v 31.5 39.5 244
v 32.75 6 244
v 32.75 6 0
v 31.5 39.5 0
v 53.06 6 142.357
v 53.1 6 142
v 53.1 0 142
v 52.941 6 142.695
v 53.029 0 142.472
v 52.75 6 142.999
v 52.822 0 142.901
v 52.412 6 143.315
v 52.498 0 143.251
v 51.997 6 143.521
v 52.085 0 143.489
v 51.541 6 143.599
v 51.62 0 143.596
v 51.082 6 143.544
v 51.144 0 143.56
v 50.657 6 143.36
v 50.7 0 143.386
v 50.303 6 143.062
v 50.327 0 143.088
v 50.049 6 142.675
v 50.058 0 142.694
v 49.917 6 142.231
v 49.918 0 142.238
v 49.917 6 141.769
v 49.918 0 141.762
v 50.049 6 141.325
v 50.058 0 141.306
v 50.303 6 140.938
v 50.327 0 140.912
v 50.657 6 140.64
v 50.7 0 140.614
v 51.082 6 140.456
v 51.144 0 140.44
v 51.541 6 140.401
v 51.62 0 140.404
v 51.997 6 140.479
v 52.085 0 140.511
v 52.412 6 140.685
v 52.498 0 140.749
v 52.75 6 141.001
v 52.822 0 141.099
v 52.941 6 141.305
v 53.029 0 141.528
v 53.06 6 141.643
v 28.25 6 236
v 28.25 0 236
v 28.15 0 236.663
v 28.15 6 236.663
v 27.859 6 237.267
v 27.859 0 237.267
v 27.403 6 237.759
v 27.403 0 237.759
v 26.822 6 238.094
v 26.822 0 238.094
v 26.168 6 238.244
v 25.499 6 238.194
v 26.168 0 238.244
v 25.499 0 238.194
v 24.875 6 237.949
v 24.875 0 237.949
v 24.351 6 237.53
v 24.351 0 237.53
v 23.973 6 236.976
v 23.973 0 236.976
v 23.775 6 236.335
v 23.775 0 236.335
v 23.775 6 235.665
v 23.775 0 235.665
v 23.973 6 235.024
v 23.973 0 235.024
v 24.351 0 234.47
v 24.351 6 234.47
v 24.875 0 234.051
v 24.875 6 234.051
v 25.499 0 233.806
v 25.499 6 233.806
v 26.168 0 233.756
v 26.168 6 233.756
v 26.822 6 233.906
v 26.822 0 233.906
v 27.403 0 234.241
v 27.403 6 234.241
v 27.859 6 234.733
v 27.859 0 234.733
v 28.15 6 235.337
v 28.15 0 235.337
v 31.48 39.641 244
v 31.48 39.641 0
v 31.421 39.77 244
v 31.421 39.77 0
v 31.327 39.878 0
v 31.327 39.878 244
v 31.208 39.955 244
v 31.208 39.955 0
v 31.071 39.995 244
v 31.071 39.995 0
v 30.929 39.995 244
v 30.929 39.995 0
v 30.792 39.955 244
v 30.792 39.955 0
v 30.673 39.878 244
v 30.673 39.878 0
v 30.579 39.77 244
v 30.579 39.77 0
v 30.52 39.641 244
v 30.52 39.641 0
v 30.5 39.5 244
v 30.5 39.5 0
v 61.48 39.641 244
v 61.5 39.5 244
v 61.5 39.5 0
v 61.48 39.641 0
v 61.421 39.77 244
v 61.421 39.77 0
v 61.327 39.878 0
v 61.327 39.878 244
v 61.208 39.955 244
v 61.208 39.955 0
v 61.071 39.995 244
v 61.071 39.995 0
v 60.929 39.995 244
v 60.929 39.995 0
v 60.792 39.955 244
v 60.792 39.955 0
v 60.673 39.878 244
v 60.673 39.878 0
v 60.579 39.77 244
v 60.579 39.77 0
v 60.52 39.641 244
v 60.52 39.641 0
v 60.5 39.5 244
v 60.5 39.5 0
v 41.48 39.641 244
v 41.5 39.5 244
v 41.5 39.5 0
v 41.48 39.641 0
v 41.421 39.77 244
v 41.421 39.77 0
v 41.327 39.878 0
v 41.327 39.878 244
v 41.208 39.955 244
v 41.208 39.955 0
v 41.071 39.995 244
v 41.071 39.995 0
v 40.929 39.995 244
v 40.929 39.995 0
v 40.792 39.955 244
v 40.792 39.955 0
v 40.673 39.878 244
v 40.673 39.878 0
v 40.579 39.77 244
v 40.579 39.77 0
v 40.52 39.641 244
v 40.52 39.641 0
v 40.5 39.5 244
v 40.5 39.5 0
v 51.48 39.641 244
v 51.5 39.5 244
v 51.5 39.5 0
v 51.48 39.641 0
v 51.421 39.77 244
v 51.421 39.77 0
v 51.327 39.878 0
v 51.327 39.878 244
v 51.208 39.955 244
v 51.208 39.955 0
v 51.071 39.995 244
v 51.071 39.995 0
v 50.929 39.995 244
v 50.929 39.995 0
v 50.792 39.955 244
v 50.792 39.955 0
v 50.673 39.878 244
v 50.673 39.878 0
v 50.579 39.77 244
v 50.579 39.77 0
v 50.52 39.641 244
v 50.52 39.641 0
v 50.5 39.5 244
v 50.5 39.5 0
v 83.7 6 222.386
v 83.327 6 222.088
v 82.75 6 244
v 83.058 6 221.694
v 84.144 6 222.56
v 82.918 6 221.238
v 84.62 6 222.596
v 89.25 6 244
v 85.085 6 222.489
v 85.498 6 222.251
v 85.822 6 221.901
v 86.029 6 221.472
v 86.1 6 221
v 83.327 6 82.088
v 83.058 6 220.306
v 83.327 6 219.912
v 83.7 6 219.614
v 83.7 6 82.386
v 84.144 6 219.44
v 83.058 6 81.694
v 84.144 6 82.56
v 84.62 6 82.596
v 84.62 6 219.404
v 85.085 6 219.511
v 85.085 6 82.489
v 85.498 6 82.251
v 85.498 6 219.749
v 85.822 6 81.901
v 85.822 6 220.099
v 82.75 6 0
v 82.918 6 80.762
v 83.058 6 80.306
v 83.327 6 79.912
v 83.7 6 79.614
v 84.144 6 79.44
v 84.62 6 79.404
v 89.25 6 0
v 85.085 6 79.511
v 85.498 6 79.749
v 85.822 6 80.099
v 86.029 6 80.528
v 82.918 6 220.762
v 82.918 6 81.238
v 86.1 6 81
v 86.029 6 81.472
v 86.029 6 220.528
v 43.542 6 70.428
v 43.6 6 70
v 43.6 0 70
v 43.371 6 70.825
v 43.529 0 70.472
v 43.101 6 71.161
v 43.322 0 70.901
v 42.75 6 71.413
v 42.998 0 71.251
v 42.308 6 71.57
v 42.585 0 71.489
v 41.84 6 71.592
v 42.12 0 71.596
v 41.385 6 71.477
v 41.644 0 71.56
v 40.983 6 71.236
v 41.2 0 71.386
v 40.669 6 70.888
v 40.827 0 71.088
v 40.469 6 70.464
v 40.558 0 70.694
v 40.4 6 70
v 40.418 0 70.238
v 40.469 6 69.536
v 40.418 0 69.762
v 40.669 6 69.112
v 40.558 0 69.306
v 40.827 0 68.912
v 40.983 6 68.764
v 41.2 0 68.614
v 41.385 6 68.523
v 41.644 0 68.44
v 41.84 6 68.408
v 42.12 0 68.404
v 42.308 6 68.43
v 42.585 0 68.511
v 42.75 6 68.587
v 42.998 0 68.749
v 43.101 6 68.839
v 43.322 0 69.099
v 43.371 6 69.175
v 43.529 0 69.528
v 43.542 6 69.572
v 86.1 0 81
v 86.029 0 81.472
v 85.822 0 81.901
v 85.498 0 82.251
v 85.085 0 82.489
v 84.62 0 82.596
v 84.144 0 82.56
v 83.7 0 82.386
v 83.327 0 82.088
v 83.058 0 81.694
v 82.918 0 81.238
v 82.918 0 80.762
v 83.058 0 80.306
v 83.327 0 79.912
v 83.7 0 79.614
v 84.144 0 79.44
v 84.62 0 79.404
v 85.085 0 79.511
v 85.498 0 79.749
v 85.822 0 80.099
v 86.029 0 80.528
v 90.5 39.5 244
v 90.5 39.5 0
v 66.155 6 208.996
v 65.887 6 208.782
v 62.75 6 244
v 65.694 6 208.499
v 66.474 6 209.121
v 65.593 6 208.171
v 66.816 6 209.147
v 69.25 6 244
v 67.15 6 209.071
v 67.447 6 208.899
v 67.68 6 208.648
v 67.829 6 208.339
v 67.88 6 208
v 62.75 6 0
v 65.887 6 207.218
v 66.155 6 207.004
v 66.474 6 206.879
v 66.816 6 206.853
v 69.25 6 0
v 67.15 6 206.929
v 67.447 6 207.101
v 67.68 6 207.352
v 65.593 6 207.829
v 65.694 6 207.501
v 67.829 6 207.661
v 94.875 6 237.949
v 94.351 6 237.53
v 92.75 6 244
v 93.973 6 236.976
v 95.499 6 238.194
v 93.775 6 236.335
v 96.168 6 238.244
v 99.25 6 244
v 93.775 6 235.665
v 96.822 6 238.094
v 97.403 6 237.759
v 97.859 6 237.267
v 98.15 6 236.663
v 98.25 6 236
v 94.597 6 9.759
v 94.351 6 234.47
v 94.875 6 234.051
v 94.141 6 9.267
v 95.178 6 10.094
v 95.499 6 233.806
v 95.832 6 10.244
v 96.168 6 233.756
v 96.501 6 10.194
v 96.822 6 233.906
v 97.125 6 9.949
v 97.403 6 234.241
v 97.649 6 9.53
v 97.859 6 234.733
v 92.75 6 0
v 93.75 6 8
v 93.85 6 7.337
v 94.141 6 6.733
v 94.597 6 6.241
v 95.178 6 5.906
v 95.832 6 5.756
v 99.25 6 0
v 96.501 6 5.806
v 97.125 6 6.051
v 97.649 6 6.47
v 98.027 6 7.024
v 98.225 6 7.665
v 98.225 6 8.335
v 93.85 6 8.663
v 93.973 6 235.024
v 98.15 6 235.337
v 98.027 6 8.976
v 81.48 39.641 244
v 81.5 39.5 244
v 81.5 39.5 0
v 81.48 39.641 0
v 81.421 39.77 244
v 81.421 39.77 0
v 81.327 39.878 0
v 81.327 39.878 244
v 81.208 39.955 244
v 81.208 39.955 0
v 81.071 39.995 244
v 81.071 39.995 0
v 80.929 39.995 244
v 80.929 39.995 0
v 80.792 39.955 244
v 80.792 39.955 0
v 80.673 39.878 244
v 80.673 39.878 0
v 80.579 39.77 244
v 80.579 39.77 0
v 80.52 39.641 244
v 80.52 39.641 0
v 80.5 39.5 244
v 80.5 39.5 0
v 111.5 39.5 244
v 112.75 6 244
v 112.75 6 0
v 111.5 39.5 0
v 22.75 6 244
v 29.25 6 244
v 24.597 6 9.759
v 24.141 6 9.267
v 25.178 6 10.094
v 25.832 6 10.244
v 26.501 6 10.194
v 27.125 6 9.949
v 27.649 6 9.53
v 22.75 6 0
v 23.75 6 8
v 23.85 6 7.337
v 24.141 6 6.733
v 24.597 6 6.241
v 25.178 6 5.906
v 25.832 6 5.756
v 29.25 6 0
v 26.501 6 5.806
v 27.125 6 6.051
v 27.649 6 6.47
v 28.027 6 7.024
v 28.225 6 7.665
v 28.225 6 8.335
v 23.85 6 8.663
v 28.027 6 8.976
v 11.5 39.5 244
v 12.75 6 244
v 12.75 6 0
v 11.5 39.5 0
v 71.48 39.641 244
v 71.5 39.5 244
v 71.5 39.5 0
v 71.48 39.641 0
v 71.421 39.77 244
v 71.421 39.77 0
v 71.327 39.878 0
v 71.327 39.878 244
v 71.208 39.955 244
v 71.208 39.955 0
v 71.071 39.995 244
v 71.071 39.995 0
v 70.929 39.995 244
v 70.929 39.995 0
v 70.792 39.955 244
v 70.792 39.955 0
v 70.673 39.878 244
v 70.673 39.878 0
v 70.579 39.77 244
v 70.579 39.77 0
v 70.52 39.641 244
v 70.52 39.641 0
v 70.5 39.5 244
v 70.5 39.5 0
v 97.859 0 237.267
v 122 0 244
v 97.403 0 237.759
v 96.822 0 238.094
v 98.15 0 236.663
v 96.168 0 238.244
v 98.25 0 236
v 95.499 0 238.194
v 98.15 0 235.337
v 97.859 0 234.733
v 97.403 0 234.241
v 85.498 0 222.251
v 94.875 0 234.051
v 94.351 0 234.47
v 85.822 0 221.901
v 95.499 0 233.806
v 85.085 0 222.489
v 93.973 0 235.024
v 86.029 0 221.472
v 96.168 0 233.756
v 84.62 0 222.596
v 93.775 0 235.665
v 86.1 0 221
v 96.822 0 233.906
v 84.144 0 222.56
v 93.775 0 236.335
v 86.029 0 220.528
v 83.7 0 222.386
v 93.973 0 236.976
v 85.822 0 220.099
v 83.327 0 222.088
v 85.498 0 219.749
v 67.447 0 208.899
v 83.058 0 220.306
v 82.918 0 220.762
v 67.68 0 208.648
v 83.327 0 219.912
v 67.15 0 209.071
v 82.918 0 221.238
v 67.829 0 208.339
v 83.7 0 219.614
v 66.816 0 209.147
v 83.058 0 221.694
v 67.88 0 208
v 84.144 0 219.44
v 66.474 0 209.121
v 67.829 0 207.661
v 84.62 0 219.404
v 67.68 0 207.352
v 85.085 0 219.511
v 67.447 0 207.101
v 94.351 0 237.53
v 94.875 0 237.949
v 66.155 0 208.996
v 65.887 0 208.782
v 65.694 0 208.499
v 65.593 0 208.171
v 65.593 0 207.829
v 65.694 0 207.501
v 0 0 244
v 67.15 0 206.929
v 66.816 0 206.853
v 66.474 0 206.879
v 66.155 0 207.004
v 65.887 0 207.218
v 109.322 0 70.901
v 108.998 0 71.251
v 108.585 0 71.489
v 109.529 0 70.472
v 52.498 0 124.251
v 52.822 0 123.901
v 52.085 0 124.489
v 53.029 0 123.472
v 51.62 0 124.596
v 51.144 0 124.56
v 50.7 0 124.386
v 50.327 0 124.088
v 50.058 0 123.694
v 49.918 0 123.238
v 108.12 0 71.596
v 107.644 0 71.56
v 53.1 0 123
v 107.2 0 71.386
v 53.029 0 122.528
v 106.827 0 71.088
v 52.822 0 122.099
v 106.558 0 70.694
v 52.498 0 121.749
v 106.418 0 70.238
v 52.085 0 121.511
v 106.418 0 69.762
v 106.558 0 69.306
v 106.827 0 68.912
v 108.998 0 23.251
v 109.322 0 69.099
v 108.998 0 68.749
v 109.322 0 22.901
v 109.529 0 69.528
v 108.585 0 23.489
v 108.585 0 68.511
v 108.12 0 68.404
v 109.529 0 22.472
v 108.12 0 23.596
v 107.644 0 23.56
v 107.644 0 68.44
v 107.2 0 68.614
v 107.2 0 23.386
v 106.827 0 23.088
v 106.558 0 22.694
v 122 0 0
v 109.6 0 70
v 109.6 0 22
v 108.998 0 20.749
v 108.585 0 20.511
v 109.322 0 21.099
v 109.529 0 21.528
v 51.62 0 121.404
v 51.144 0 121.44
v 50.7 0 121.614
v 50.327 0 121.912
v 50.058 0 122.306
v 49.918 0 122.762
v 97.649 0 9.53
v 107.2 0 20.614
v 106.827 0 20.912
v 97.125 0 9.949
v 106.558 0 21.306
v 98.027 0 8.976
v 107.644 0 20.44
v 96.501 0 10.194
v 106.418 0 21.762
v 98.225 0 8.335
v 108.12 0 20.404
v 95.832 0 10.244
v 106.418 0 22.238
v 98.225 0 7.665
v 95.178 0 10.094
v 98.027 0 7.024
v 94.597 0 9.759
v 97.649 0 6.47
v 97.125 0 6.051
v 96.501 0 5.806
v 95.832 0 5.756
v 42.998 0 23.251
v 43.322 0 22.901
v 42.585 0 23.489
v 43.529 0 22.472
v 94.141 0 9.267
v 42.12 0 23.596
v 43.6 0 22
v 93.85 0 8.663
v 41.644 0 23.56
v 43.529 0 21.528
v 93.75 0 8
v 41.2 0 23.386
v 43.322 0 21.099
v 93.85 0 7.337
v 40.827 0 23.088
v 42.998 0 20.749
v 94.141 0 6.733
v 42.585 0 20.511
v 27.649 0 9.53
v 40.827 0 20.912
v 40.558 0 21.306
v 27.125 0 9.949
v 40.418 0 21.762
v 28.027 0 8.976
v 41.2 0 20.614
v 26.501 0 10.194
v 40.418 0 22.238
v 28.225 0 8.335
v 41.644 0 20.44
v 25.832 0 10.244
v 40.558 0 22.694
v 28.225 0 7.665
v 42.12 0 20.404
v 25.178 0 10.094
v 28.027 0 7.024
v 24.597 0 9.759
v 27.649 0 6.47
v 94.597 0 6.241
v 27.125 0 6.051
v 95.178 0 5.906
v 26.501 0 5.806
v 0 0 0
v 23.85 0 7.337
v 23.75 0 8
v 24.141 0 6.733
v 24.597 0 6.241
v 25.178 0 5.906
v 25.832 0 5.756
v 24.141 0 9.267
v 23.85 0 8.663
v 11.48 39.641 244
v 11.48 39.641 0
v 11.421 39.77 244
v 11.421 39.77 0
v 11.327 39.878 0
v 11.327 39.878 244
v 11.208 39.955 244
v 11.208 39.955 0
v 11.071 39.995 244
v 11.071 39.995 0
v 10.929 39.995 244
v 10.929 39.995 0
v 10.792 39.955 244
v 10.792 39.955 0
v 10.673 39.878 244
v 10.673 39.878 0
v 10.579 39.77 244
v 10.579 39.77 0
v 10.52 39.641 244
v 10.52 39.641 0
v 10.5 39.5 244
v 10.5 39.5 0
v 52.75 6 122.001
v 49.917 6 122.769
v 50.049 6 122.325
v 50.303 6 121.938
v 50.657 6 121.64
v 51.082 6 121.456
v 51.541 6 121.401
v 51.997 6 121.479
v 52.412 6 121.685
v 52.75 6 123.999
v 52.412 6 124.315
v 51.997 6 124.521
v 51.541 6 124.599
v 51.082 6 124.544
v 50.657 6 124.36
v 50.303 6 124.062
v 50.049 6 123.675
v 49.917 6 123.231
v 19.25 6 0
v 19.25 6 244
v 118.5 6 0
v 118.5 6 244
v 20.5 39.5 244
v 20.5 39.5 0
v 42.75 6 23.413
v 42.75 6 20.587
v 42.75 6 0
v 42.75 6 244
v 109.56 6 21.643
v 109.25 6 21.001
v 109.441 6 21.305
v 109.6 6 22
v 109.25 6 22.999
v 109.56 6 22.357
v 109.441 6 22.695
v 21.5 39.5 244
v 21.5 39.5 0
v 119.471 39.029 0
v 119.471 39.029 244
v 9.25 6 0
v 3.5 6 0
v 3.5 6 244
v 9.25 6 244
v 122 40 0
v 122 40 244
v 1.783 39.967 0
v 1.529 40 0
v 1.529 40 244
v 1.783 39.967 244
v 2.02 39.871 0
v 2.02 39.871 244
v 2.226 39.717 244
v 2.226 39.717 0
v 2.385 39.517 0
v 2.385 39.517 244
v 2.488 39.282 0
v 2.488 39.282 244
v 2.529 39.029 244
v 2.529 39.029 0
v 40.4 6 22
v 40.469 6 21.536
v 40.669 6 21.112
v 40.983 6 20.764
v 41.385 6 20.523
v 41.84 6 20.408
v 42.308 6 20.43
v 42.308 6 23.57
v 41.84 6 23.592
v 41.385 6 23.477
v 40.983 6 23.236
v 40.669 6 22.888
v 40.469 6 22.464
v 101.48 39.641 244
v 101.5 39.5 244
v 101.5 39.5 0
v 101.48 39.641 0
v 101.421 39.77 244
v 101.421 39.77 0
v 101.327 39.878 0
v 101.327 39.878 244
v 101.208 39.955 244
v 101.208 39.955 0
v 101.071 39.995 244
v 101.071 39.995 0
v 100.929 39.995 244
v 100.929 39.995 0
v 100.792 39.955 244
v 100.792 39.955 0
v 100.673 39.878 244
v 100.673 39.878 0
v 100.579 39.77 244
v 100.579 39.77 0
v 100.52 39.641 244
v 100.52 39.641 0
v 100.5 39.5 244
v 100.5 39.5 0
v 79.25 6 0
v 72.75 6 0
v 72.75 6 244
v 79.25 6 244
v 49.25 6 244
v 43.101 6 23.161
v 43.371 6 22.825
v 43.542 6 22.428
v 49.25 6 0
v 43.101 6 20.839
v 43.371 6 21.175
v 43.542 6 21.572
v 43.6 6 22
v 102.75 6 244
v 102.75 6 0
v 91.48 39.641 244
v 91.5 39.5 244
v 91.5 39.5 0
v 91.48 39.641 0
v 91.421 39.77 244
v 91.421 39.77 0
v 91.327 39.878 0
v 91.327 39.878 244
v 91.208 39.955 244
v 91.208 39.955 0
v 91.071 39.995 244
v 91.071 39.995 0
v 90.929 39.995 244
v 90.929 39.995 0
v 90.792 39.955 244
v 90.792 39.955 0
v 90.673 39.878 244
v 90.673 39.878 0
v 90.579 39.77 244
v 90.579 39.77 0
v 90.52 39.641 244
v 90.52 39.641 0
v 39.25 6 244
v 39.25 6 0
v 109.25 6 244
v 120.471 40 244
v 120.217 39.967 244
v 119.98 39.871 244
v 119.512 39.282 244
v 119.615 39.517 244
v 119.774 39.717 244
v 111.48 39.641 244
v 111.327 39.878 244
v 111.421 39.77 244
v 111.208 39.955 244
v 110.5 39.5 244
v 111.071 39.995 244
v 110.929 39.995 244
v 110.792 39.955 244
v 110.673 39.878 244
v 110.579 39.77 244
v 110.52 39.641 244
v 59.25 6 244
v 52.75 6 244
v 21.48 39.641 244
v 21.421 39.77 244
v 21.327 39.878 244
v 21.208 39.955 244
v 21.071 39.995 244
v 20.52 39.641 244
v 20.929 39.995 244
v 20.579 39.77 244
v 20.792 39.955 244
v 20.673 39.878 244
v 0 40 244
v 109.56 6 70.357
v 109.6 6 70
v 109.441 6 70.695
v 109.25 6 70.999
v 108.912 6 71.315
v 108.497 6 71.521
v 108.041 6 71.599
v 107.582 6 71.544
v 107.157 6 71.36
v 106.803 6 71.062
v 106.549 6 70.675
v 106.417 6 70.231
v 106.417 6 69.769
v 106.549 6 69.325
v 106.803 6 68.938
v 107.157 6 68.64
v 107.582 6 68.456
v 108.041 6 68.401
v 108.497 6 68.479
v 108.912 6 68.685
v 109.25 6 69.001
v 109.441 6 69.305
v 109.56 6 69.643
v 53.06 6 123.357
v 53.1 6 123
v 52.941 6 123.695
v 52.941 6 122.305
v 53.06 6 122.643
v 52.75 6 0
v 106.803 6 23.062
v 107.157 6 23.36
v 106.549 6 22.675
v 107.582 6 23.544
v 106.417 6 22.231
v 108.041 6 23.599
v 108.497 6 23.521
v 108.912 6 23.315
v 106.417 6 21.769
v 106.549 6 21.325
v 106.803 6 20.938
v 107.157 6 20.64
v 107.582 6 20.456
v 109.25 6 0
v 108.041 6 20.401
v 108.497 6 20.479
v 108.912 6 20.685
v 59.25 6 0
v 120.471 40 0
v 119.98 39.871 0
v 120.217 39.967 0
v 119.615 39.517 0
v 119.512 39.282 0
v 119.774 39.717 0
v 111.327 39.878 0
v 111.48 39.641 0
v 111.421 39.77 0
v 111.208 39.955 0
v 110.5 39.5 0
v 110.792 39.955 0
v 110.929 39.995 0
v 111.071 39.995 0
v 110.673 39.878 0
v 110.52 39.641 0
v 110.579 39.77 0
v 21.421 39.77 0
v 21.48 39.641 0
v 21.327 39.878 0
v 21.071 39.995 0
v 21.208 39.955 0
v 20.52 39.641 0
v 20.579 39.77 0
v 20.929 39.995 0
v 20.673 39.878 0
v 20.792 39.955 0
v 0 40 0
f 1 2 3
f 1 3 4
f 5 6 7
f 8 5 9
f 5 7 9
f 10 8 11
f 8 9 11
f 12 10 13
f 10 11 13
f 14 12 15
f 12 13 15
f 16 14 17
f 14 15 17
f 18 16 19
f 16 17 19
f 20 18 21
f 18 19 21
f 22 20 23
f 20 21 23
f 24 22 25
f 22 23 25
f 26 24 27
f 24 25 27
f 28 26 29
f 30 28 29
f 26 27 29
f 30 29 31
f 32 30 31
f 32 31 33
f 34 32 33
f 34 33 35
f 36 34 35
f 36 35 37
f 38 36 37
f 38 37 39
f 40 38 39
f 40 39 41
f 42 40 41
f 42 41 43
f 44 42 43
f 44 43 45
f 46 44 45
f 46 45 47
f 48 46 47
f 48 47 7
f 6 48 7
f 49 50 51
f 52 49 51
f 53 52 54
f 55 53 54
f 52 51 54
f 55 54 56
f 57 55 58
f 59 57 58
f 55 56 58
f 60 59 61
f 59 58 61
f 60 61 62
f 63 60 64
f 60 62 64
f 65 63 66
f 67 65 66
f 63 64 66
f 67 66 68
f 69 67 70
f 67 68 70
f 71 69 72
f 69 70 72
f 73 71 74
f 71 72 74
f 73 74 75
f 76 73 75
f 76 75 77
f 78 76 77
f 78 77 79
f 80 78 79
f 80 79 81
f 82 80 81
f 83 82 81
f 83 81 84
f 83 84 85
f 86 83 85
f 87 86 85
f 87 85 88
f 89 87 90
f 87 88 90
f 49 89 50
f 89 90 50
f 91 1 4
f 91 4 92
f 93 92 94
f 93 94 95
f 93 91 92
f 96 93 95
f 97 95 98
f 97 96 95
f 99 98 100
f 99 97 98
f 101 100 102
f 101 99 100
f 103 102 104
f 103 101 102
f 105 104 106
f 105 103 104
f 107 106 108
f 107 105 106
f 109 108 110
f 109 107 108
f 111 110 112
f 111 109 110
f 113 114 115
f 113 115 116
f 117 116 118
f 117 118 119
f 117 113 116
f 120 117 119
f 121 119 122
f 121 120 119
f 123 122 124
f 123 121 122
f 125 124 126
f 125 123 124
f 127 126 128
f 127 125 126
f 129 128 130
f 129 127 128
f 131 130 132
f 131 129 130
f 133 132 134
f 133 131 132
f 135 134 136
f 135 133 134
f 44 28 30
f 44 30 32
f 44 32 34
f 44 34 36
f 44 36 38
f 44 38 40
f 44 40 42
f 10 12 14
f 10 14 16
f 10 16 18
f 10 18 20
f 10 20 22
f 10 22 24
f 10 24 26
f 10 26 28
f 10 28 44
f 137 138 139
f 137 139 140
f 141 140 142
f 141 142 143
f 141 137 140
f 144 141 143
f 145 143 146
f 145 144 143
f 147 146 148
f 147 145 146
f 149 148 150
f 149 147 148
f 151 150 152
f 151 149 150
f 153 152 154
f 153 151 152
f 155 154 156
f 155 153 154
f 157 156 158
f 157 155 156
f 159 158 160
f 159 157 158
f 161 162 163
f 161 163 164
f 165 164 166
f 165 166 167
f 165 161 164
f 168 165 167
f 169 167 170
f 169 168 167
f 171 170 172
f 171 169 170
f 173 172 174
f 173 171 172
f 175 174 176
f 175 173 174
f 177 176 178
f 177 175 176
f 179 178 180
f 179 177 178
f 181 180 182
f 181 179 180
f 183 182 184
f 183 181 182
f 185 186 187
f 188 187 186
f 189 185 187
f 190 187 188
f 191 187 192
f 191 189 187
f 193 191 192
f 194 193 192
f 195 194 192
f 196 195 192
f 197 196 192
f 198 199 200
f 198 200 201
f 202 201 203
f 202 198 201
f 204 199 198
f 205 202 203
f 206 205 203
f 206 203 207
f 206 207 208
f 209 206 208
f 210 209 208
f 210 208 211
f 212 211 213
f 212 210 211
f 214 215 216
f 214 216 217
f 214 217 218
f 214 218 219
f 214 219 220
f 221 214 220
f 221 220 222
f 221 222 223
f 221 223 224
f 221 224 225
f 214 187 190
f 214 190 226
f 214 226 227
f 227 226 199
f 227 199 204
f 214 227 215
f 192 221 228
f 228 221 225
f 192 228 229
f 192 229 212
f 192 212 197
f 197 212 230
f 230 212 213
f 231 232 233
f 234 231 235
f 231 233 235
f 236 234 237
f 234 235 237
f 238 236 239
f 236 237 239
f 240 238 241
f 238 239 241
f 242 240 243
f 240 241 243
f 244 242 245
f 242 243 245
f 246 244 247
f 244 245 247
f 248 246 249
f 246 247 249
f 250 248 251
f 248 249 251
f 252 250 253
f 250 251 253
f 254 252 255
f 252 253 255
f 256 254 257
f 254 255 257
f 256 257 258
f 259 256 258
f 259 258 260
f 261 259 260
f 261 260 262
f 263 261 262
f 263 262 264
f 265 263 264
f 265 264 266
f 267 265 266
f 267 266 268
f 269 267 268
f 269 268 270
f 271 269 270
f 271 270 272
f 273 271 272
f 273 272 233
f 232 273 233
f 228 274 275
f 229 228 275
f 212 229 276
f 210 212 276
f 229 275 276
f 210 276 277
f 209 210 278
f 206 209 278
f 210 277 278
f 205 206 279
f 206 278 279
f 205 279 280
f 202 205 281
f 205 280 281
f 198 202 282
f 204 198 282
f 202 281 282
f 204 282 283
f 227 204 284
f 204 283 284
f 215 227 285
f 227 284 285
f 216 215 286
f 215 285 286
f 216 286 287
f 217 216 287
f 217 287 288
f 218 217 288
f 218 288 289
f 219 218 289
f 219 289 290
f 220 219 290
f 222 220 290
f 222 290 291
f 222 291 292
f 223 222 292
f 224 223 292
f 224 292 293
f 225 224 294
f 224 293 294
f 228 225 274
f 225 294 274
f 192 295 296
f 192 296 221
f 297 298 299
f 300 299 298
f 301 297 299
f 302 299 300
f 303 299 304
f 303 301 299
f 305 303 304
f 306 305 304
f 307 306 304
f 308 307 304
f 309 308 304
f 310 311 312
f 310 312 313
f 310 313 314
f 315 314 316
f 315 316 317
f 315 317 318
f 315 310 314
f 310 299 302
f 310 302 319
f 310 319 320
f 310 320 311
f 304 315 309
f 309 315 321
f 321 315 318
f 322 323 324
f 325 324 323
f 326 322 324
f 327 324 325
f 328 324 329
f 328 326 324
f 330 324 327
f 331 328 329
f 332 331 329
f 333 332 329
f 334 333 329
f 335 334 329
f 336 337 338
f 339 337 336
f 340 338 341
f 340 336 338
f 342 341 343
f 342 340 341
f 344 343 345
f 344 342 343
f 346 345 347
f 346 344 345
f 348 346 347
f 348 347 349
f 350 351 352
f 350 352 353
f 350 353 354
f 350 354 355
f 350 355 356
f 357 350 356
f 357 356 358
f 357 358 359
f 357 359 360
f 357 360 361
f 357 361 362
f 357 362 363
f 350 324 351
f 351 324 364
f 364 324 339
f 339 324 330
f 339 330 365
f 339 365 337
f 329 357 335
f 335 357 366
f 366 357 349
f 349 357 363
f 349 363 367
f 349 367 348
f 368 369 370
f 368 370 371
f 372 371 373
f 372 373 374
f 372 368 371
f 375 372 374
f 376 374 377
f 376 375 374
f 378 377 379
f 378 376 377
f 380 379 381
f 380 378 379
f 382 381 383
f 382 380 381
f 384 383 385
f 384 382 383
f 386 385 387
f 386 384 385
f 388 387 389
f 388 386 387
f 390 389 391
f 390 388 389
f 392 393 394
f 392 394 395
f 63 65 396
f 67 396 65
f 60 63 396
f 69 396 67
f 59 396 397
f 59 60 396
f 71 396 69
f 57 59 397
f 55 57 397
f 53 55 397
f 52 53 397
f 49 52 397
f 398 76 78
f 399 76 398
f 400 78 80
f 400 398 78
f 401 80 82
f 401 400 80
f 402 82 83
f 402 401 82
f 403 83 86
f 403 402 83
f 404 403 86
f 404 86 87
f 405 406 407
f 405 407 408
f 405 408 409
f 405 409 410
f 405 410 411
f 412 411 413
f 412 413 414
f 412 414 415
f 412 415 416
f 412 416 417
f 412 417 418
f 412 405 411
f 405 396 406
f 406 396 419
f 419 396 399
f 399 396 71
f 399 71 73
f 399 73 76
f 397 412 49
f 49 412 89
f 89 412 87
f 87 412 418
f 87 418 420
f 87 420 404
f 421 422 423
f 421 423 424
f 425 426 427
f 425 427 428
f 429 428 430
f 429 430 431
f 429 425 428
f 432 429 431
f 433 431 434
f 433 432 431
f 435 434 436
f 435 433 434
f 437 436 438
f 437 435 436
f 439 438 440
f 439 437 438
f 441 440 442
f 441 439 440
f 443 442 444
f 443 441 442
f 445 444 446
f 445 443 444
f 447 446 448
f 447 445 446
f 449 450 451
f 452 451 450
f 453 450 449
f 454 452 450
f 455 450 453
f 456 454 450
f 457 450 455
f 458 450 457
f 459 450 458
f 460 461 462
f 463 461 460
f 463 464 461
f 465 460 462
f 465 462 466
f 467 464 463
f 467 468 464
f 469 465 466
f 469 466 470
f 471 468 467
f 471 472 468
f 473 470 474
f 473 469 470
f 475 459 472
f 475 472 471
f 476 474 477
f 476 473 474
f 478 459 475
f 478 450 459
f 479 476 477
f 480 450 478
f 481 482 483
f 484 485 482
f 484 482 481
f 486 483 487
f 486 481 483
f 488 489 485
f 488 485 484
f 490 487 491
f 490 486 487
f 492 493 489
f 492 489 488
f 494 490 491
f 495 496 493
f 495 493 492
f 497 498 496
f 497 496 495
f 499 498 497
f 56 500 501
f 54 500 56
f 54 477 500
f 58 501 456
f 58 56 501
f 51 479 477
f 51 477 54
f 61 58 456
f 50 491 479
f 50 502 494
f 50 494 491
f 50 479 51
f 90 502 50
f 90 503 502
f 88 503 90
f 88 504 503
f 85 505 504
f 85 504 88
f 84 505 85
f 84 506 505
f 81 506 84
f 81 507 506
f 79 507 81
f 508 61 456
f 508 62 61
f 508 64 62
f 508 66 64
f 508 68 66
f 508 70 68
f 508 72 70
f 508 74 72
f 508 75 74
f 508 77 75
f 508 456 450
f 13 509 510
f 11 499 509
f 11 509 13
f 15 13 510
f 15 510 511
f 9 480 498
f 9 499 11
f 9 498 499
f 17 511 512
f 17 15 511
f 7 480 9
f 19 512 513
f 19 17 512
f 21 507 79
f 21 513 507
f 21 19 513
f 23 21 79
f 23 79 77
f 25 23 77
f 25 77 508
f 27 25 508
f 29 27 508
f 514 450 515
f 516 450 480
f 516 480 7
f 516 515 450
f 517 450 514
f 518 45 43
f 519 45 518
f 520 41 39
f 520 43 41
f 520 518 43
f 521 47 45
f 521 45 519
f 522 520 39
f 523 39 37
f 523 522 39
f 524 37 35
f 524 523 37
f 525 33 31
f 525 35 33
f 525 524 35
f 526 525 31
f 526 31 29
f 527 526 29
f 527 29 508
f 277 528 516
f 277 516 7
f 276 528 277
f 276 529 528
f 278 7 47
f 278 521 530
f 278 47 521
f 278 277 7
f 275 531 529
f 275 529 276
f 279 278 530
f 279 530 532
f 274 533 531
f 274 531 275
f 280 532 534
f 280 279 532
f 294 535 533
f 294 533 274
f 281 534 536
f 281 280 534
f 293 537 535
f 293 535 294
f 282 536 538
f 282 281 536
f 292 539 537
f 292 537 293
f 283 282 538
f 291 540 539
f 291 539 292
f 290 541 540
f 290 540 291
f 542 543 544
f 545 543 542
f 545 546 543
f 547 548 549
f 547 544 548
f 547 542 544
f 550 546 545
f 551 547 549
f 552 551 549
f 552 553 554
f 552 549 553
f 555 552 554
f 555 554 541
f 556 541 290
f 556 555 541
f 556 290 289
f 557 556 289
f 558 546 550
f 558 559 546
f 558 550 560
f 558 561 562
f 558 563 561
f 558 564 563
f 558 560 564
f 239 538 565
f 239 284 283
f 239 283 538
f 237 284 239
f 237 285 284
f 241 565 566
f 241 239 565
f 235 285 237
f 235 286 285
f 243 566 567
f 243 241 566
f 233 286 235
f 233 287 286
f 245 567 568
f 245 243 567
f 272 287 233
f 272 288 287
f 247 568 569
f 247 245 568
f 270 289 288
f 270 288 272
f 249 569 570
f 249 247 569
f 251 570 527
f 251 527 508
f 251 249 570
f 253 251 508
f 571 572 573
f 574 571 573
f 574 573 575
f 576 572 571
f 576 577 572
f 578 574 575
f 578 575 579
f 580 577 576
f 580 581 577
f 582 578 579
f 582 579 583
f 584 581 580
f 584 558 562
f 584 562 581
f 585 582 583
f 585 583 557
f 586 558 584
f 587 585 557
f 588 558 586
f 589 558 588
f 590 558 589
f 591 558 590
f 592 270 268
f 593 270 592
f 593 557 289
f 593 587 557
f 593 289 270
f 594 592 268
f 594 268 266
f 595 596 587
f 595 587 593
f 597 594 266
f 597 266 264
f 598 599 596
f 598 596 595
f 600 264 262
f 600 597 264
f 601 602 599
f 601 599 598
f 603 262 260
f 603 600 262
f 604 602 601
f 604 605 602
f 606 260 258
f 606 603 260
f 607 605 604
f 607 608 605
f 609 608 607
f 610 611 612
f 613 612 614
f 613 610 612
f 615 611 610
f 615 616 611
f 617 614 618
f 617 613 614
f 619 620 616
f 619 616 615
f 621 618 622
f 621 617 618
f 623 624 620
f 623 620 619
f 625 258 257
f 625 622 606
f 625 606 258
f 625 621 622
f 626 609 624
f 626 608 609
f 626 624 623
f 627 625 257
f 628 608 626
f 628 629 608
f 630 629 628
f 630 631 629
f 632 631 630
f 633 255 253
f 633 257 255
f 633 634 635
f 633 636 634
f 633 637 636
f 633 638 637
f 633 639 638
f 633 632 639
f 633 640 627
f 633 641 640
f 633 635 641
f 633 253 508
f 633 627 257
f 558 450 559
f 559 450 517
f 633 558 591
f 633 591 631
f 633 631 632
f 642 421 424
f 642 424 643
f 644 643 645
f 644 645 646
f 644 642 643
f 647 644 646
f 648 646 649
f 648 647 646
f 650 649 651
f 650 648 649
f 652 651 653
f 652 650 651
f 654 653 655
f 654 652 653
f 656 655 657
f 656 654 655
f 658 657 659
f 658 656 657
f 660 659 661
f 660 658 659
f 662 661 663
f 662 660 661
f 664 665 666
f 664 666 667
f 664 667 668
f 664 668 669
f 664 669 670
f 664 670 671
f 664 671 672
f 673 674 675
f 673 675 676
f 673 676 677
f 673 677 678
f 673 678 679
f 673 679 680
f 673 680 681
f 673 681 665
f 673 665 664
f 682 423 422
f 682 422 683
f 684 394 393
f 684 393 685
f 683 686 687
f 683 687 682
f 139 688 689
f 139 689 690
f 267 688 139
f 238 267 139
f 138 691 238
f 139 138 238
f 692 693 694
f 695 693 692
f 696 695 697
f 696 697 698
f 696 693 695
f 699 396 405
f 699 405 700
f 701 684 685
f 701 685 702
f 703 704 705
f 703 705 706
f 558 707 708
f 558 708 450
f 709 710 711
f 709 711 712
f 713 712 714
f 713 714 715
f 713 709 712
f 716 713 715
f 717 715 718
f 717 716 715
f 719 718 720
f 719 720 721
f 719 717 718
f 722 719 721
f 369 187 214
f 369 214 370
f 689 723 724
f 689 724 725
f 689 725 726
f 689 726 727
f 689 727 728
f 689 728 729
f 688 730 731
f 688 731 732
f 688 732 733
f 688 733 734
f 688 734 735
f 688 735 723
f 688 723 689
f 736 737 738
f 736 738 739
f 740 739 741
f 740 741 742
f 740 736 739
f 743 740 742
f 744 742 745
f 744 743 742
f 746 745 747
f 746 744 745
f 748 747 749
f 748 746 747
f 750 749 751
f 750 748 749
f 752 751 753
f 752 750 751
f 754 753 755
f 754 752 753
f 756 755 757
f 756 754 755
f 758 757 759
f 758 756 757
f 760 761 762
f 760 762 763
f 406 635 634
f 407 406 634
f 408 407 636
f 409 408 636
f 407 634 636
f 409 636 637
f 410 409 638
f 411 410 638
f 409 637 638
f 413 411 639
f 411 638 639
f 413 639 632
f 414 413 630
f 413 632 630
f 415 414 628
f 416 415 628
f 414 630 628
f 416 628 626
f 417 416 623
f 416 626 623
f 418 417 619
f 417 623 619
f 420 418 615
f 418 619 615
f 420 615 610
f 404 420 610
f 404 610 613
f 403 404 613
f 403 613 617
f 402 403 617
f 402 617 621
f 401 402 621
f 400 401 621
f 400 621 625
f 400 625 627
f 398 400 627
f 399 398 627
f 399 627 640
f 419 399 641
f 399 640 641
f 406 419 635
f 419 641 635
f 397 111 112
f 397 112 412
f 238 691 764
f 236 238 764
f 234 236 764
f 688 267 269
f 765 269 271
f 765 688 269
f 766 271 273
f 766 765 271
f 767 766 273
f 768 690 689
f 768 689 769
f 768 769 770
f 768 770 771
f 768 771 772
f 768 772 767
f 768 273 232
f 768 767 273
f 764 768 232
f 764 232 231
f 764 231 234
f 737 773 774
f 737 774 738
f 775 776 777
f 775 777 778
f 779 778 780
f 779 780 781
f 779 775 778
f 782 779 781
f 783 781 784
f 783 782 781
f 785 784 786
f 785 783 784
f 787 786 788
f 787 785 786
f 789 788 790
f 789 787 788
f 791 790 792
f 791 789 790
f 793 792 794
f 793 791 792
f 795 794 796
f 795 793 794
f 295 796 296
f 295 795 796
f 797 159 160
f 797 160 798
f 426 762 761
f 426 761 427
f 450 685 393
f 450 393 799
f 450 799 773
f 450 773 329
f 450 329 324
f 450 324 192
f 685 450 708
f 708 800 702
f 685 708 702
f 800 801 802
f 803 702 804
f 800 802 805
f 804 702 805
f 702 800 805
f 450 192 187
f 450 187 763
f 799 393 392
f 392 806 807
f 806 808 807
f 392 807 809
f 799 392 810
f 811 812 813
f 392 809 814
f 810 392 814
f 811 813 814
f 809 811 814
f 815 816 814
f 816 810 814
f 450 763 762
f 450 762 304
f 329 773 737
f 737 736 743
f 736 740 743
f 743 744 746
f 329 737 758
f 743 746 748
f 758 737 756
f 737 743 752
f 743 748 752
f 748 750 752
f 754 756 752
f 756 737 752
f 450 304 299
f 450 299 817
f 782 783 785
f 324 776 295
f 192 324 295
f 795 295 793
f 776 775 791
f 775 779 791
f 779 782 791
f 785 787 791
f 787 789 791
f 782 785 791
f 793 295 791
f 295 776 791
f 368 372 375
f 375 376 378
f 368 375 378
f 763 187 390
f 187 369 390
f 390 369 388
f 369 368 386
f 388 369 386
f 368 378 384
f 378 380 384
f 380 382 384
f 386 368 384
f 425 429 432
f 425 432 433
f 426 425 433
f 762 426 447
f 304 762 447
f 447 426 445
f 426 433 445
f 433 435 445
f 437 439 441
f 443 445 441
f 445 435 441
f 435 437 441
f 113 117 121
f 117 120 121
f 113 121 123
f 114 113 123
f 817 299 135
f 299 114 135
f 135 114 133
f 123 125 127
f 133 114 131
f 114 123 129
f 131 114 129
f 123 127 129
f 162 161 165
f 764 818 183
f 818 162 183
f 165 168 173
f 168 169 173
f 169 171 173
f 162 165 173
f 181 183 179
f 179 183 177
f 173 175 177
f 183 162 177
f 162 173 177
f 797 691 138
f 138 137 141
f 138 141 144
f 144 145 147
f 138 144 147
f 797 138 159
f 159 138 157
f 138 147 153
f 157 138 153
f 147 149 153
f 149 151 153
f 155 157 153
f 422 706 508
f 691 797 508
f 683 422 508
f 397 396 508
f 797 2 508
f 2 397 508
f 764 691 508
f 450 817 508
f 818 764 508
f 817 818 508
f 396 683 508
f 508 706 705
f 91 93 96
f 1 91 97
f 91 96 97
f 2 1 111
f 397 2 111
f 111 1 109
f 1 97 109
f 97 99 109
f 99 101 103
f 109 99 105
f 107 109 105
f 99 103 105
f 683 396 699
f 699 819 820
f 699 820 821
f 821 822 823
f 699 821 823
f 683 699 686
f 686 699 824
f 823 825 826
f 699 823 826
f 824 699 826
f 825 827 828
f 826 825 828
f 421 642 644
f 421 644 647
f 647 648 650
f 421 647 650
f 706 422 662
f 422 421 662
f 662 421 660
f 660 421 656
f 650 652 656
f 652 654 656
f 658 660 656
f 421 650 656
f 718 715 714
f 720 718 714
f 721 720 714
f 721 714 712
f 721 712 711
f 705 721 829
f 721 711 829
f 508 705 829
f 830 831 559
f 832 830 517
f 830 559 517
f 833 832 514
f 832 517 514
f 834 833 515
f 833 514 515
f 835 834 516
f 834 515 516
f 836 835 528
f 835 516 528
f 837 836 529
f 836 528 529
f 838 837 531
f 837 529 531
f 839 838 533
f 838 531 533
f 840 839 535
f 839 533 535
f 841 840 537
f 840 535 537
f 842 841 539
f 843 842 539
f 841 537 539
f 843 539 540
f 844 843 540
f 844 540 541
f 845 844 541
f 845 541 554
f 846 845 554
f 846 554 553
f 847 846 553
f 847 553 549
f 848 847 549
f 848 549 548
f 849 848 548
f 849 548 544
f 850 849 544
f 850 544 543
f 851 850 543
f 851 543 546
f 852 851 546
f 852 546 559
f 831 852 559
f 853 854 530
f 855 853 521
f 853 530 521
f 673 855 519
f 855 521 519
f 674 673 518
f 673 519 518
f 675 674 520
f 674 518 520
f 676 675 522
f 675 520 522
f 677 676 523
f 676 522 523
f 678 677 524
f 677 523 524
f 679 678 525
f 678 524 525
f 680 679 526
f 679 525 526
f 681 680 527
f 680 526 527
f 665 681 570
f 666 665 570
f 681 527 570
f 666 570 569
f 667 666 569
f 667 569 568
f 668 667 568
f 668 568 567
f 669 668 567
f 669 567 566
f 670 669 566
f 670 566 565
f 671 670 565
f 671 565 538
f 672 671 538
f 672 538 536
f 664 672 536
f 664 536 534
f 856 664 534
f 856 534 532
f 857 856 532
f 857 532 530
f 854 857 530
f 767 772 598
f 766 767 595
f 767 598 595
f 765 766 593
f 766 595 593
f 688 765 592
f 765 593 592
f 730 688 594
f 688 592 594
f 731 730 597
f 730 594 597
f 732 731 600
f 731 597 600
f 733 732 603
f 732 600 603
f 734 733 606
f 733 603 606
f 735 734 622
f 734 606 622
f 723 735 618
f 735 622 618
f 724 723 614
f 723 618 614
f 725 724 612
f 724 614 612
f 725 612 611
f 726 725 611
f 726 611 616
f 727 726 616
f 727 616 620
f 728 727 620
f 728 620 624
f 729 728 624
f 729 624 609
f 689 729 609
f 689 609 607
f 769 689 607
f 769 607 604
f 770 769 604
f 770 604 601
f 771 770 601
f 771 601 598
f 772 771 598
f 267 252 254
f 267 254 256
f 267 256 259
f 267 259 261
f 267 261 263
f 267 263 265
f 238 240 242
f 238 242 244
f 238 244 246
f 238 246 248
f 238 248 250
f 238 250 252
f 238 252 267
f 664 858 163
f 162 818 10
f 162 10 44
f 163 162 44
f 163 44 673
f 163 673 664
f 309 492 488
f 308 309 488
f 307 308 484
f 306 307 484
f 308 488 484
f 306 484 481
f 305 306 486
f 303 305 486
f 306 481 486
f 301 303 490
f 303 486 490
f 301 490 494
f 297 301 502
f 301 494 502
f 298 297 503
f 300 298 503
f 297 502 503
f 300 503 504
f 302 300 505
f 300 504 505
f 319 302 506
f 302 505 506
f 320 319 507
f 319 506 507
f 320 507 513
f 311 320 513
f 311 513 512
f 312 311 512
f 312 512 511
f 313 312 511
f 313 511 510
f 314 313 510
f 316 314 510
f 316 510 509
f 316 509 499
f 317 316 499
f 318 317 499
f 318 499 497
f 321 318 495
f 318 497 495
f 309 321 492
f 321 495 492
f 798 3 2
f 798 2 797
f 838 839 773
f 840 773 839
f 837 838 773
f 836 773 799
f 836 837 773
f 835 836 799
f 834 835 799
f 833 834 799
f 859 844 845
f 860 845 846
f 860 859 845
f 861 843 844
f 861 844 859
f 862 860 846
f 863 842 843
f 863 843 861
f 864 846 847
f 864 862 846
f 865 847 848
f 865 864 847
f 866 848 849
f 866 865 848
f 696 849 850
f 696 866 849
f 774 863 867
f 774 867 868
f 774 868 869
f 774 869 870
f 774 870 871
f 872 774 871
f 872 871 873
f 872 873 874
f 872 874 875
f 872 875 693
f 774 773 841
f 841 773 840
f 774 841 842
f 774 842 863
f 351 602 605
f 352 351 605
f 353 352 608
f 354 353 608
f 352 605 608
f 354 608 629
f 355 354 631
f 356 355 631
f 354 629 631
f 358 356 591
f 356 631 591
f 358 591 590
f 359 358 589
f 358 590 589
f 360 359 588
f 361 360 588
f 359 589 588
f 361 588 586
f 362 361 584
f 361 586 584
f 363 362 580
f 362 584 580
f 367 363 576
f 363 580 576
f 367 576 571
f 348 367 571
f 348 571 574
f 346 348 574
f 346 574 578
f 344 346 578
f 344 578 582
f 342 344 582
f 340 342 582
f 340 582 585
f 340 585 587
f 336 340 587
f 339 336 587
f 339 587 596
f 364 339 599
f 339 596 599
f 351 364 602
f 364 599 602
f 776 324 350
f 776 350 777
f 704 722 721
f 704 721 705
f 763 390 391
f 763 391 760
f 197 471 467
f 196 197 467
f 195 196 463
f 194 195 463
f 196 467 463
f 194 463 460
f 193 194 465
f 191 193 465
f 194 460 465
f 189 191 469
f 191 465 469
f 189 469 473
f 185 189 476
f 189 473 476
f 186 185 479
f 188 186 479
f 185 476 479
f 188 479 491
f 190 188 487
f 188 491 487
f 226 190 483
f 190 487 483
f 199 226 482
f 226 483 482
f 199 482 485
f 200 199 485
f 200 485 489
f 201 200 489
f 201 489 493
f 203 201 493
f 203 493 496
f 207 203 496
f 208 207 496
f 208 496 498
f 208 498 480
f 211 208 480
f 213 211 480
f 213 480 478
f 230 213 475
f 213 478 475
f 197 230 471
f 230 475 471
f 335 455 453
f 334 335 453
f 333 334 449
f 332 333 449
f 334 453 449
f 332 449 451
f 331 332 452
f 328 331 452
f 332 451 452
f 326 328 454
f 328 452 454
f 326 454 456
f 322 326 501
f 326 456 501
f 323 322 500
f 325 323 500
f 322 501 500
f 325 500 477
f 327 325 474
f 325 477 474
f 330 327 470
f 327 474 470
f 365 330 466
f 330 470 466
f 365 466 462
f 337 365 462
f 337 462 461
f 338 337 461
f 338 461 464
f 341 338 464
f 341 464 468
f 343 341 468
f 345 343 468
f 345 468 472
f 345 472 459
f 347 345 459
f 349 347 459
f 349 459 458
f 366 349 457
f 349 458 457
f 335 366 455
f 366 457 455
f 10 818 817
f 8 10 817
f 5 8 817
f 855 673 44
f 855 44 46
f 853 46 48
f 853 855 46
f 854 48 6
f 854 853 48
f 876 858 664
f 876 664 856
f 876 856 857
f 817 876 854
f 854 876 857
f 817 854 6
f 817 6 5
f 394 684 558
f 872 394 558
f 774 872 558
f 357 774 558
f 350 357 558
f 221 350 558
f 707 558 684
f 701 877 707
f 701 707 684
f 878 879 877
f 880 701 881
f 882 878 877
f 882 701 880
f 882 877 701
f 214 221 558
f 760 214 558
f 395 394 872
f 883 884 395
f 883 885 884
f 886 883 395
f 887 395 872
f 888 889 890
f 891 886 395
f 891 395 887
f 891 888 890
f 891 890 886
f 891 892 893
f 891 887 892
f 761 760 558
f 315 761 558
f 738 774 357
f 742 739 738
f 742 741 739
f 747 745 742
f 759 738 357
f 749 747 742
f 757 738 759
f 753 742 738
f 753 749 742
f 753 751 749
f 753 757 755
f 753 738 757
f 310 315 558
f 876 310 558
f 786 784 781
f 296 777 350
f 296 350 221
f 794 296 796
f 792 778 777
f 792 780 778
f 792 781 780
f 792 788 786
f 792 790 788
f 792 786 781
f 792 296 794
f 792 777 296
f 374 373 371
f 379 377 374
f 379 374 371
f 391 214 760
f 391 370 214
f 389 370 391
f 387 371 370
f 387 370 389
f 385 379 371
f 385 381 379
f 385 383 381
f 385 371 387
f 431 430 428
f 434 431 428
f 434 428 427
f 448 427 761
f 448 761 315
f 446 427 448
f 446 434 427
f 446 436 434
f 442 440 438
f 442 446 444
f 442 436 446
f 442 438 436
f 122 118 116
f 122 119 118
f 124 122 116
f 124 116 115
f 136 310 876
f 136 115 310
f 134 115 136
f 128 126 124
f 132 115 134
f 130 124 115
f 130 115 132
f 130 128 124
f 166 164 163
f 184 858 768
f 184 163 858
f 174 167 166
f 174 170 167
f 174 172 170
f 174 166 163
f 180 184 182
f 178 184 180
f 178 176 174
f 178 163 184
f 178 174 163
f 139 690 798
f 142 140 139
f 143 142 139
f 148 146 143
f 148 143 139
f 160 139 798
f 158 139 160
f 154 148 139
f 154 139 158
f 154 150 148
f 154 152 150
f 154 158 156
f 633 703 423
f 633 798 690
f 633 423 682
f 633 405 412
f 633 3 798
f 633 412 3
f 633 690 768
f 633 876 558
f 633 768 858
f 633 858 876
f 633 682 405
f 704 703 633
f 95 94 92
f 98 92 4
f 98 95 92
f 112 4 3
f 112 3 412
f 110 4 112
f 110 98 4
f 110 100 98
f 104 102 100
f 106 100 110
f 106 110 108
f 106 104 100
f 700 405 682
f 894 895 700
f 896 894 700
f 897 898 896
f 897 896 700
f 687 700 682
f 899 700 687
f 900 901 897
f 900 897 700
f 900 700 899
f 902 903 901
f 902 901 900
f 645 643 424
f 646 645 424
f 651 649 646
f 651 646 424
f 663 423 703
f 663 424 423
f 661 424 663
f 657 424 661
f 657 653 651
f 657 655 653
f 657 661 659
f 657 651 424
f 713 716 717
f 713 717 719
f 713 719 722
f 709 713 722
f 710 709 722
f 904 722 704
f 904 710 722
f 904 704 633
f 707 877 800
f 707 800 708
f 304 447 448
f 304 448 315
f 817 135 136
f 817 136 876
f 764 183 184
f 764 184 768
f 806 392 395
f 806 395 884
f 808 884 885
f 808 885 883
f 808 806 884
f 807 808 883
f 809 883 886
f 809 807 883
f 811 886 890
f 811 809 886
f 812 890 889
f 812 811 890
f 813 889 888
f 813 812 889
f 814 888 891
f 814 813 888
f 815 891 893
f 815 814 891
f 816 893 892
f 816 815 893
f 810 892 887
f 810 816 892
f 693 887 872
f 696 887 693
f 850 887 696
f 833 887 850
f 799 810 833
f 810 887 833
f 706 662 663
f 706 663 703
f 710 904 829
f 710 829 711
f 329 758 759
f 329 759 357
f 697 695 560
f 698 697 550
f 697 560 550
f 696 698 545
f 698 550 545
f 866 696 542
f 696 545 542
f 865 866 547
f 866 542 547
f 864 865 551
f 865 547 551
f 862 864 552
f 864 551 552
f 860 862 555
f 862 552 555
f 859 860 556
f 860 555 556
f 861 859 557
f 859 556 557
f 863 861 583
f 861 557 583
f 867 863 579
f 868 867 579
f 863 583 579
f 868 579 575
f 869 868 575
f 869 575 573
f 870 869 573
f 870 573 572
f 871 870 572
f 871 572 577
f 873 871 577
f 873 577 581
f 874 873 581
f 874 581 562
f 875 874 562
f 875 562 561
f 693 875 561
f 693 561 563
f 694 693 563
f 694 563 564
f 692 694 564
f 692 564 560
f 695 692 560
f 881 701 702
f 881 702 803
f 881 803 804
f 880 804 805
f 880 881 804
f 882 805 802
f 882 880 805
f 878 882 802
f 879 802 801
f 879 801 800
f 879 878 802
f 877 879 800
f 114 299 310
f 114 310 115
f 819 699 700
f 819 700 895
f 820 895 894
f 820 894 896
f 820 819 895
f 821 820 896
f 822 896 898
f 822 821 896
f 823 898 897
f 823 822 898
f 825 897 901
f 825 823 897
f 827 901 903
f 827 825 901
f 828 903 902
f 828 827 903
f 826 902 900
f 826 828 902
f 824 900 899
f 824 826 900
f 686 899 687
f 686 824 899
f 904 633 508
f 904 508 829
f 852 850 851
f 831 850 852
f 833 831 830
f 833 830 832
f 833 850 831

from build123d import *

# Parameters (mm, degrees)
EXTRUDE_1_DEPTH       = 244
EXTRUDE_3_DEPTH       = 244
PATTERN_CURVE_1_COUNT = 11
PATTERN_CURVE_1_PITCH = 10
SKETCH_3_R            = 2.25
CUT_EXTRUDE_1_DEPTH   = 6
SKETCH_4_R            = 1.6
SKETCH_4_R_2          = 1.15
CUT_EXTRUDE_2_DEPTH   = 6


with BuildPart() as part:
    # Эскиз1 → Вытянуть1 (new body)
    with BuildSketch(Plane.XY):
        with BuildLine():
            Line((0, 40), (1.528979332, 40))
            ThreePointArc((1.528979332, 40), (2.225614441, 39.717425624), (2.528547087, 39.029399052))
            Line((2.528547087, 39.029399052), (3.5, 6))
            Line((3.5, 6), (118.5, 6))
            Line((118.5, 6), (119.471452913, 39.029399052))
            ThreePointArc((119.471452913, 39.029399052), (119.774385559, 39.717425624), (120.471020668, 40))
            Line((120.471020668, 40), (122, 40))
            Line((122, 40), (122, 0))
            Line((122, 0), (0, 0))
            Line((0, 0), (0, 40))
        make_face()
    extrude(amount=EXTRUDE_1_DEPTH)

    # Эскиз2 → Вытянуть3 (add)
    with BuildSketch(Plane.XY.offset(244)):
        with BuildLine():
            Line((10.5, 39.5), (9.25, 6))
            Line((9.25, 6), (12.75, 6))
            Line((12.75, 6), (11.5, 39.5))
            ThreePointArc((11.5, 39.5), (11, 40), (10.5, 39.5))
        make_face()
    extrude_3 = extrude(amount=-EXTRUDE_3_DEPTH)

    # Кривая1: Вытянуть3 ×11
    with Locations(*[(i * PATTERN_CURVE_1_PITCH, 0, 0) for i in range(1, PATTERN_CURVE_1_COUNT)]):
        add(extrude_3)

    # Эскиз3 → Вырез-Вытянуть1 (cut)
    with BuildSketch(Plane.XZ):
        with Locations((26, 236)):
            Circle(SKETCH_3_R)
        with Locations((96, 236)):
            Circle(SKETCH_3_R)
        with Locations(Location((96, 8, 0), (0, 0, 180))):
            Circle(SKETCH_3_R)
        with Locations(Location((26, 8, 0), (0, 0, 180))):
            Circle(SKETCH_3_R)
    extrude(amount=-CUT_EXTRUDE_1_DEPTH, mode=Mode.SUBTRACT)

    # Эскиз4 → Вырез-Вытянуть2 (cut)
    with BuildSketch(Plane(origin=(133.240090243, 0, 310.149074448), x_dir=(-1, 0, 0), z_dir=(0, -1, 0))):
        with Locations(Location((48.740090243, 89.149074448, 0), (0, 0, 180))):
            Circle(SKETCH_4_R)
        with Locations(Location((48.740090243, 229.149074448, 0), (0, 0, 180))):
            Circle(SKETCH_4_R)
        with Locations((8.990090243, 225.549074448)):
            Circle(SKETCH_4_R)
        with Locations(Location((66.510090243, 102.149074448, 0), (0, 0, 180))):
            Circle(SKETCH_4_R_2)
        with Locations(Location((81.740090243, 187.149074448, 0), (0, 0, 180))):
            Circle(SKETCH_4_R)
        with Locations(Location((91.240090243, 288.149074448, 0), (0, 0, 180))):
            Circle(SKETCH_4_R)
        with Locations(Location((91.240090243, 240.149074448, 0), (0, 0, 180))):
            Circle(SKETCH_4_R)
        with Locations(Location((25.240090243, 240.149074448, 0), (0, 0, 180))):
            Circle(SKETCH_4_R)
        with Locations(Location((25.240090243, 288.149074448, 0), (0, 0, 180))):
            Circle(SKETCH_4_R)
        with Locations(Location((81.740090243, 168.149074448, 0), (0, 0, 180))):
            Circle(SKETCH_4_R)
    extrude(amount=-CUT_EXTRUDE_2_DEPTH, mode=Mode.SUBTRACT)


solid = part.part
